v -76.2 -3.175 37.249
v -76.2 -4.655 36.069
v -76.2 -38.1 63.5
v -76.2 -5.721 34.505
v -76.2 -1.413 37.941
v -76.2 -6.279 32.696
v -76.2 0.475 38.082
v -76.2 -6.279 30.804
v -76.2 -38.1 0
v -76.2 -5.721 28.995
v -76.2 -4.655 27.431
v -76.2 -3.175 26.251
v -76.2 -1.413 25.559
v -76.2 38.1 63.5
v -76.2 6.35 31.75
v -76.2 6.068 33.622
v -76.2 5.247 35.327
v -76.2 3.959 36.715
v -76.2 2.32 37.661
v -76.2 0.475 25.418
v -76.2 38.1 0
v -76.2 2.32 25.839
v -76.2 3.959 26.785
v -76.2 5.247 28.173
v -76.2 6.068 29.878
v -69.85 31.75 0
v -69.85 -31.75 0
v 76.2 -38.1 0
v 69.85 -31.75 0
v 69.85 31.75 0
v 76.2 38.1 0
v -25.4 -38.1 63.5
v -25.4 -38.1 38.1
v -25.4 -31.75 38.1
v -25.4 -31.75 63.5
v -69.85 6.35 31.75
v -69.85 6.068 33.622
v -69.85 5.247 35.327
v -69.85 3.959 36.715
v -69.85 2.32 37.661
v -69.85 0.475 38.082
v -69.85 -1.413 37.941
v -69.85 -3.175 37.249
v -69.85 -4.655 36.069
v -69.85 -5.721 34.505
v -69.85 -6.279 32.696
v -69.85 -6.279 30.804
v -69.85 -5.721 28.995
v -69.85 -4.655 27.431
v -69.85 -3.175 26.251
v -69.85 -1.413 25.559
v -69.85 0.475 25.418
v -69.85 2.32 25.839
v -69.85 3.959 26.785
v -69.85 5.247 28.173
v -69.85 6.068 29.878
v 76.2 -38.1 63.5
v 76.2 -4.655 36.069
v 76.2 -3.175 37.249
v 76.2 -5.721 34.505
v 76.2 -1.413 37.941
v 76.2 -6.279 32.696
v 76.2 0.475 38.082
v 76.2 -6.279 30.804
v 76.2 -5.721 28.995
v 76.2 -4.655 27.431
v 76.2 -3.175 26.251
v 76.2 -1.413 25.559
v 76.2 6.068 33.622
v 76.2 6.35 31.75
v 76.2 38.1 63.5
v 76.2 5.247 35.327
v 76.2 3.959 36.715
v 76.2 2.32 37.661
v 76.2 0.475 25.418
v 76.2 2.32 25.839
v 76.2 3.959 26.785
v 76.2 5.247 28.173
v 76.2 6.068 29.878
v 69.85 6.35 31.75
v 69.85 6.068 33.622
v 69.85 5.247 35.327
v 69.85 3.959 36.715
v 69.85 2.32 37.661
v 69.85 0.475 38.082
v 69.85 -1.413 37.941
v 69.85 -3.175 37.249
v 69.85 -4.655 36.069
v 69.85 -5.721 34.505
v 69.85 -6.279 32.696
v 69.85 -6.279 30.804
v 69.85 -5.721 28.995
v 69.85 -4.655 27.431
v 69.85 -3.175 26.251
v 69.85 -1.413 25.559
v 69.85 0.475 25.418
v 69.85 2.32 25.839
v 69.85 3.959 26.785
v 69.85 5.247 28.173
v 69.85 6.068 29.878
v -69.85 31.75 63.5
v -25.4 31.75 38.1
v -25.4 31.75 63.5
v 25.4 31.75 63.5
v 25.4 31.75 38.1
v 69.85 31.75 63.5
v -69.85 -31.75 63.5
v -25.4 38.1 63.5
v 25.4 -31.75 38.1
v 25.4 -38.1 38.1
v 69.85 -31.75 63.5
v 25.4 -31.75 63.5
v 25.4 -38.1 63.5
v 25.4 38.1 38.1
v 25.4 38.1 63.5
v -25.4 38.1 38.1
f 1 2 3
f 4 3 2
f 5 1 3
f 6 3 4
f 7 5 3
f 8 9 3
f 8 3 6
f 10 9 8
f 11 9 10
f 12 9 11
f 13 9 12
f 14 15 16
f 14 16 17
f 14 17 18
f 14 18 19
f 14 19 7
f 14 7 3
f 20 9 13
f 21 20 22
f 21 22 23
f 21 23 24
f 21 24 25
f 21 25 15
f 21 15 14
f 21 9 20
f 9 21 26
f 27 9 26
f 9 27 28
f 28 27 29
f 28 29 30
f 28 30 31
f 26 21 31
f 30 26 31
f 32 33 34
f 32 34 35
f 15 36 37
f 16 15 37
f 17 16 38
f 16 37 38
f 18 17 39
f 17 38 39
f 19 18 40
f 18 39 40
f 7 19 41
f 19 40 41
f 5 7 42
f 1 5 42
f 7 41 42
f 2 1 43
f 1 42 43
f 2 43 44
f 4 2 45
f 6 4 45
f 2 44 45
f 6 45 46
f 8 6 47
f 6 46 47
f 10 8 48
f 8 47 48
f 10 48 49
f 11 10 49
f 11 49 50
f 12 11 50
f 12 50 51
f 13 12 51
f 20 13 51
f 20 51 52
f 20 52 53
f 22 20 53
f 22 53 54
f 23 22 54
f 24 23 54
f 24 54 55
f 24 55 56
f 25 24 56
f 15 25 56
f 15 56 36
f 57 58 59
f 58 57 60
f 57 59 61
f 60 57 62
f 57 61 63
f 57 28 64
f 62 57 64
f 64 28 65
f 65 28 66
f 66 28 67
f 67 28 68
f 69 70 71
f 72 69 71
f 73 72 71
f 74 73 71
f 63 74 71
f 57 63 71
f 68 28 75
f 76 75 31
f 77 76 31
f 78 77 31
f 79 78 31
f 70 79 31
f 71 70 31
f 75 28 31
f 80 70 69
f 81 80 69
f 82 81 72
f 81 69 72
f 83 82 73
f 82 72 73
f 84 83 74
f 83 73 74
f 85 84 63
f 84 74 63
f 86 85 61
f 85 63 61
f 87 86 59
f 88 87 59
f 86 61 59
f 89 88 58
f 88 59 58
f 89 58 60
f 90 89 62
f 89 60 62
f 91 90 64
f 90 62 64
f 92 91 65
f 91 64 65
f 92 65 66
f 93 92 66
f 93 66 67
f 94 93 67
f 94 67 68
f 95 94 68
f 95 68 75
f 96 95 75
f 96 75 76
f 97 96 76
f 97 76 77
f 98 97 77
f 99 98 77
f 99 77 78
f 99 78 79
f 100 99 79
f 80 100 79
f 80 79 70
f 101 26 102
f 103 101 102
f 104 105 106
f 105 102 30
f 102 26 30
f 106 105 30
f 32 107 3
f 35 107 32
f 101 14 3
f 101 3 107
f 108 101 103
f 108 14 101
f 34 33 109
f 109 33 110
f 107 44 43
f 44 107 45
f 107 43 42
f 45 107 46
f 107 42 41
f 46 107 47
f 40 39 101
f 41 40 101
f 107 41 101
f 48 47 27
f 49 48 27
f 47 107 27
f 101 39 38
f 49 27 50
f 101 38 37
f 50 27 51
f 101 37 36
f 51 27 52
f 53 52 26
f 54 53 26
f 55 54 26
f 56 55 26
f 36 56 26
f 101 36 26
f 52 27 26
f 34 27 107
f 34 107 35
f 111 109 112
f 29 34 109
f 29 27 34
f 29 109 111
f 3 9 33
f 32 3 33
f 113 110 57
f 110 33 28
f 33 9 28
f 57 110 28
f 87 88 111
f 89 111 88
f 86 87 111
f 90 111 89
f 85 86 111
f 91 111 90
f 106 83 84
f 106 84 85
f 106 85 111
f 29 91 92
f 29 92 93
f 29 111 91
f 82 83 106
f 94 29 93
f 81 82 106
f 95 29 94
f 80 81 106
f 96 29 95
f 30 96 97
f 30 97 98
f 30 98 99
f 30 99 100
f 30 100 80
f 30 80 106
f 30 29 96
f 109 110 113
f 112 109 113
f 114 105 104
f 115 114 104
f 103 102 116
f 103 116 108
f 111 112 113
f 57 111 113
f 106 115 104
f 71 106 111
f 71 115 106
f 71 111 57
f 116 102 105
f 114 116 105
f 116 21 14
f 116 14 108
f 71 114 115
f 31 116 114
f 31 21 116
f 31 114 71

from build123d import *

# Parameters (mm, degrees)
F0_W     = 152.4
F0_H     = 76.2
F0_W_2   = 139.7
F0_H_2   = 63.5
F1_DEPTH = 63.5
F2_W     = 50.8
F2_H     = 25.4
F3_DEPTH = 81.026
F4_R     = 6.35
F5_DEPTH = 156.972


with BuildPart() as f1:
    # F0 (on Top) → F1 (new body)
    with BuildSketch(Plane.XY):
        Rectangle(F0_W, F0_H)
        Rectangle(F0_W_2, F0_H_2, mode=Mode.SUBTRACT)
    extrude(amount=F1_DEPTH)

    # F2 (on face) → F3 (cut)
    with BuildSketch(Plane.XZ.offset(38.1)):
        with Locations((0, 50.8)):
            Rectangle(F2_W, F2_H)
    extrude(amount=-F3_DEPTH, mode=Mode.SUBTRACT)

    # F4 (on face) → F5 (cut)
    with BuildSketch(Plane.YZ.offset(76.2)):
        with Locations((0, 31.75)):
            Circle(F4_R)
    extrude(amount=-F5_DEPTH, mode=Mode.SUBTRACT)


solid = f1.part
